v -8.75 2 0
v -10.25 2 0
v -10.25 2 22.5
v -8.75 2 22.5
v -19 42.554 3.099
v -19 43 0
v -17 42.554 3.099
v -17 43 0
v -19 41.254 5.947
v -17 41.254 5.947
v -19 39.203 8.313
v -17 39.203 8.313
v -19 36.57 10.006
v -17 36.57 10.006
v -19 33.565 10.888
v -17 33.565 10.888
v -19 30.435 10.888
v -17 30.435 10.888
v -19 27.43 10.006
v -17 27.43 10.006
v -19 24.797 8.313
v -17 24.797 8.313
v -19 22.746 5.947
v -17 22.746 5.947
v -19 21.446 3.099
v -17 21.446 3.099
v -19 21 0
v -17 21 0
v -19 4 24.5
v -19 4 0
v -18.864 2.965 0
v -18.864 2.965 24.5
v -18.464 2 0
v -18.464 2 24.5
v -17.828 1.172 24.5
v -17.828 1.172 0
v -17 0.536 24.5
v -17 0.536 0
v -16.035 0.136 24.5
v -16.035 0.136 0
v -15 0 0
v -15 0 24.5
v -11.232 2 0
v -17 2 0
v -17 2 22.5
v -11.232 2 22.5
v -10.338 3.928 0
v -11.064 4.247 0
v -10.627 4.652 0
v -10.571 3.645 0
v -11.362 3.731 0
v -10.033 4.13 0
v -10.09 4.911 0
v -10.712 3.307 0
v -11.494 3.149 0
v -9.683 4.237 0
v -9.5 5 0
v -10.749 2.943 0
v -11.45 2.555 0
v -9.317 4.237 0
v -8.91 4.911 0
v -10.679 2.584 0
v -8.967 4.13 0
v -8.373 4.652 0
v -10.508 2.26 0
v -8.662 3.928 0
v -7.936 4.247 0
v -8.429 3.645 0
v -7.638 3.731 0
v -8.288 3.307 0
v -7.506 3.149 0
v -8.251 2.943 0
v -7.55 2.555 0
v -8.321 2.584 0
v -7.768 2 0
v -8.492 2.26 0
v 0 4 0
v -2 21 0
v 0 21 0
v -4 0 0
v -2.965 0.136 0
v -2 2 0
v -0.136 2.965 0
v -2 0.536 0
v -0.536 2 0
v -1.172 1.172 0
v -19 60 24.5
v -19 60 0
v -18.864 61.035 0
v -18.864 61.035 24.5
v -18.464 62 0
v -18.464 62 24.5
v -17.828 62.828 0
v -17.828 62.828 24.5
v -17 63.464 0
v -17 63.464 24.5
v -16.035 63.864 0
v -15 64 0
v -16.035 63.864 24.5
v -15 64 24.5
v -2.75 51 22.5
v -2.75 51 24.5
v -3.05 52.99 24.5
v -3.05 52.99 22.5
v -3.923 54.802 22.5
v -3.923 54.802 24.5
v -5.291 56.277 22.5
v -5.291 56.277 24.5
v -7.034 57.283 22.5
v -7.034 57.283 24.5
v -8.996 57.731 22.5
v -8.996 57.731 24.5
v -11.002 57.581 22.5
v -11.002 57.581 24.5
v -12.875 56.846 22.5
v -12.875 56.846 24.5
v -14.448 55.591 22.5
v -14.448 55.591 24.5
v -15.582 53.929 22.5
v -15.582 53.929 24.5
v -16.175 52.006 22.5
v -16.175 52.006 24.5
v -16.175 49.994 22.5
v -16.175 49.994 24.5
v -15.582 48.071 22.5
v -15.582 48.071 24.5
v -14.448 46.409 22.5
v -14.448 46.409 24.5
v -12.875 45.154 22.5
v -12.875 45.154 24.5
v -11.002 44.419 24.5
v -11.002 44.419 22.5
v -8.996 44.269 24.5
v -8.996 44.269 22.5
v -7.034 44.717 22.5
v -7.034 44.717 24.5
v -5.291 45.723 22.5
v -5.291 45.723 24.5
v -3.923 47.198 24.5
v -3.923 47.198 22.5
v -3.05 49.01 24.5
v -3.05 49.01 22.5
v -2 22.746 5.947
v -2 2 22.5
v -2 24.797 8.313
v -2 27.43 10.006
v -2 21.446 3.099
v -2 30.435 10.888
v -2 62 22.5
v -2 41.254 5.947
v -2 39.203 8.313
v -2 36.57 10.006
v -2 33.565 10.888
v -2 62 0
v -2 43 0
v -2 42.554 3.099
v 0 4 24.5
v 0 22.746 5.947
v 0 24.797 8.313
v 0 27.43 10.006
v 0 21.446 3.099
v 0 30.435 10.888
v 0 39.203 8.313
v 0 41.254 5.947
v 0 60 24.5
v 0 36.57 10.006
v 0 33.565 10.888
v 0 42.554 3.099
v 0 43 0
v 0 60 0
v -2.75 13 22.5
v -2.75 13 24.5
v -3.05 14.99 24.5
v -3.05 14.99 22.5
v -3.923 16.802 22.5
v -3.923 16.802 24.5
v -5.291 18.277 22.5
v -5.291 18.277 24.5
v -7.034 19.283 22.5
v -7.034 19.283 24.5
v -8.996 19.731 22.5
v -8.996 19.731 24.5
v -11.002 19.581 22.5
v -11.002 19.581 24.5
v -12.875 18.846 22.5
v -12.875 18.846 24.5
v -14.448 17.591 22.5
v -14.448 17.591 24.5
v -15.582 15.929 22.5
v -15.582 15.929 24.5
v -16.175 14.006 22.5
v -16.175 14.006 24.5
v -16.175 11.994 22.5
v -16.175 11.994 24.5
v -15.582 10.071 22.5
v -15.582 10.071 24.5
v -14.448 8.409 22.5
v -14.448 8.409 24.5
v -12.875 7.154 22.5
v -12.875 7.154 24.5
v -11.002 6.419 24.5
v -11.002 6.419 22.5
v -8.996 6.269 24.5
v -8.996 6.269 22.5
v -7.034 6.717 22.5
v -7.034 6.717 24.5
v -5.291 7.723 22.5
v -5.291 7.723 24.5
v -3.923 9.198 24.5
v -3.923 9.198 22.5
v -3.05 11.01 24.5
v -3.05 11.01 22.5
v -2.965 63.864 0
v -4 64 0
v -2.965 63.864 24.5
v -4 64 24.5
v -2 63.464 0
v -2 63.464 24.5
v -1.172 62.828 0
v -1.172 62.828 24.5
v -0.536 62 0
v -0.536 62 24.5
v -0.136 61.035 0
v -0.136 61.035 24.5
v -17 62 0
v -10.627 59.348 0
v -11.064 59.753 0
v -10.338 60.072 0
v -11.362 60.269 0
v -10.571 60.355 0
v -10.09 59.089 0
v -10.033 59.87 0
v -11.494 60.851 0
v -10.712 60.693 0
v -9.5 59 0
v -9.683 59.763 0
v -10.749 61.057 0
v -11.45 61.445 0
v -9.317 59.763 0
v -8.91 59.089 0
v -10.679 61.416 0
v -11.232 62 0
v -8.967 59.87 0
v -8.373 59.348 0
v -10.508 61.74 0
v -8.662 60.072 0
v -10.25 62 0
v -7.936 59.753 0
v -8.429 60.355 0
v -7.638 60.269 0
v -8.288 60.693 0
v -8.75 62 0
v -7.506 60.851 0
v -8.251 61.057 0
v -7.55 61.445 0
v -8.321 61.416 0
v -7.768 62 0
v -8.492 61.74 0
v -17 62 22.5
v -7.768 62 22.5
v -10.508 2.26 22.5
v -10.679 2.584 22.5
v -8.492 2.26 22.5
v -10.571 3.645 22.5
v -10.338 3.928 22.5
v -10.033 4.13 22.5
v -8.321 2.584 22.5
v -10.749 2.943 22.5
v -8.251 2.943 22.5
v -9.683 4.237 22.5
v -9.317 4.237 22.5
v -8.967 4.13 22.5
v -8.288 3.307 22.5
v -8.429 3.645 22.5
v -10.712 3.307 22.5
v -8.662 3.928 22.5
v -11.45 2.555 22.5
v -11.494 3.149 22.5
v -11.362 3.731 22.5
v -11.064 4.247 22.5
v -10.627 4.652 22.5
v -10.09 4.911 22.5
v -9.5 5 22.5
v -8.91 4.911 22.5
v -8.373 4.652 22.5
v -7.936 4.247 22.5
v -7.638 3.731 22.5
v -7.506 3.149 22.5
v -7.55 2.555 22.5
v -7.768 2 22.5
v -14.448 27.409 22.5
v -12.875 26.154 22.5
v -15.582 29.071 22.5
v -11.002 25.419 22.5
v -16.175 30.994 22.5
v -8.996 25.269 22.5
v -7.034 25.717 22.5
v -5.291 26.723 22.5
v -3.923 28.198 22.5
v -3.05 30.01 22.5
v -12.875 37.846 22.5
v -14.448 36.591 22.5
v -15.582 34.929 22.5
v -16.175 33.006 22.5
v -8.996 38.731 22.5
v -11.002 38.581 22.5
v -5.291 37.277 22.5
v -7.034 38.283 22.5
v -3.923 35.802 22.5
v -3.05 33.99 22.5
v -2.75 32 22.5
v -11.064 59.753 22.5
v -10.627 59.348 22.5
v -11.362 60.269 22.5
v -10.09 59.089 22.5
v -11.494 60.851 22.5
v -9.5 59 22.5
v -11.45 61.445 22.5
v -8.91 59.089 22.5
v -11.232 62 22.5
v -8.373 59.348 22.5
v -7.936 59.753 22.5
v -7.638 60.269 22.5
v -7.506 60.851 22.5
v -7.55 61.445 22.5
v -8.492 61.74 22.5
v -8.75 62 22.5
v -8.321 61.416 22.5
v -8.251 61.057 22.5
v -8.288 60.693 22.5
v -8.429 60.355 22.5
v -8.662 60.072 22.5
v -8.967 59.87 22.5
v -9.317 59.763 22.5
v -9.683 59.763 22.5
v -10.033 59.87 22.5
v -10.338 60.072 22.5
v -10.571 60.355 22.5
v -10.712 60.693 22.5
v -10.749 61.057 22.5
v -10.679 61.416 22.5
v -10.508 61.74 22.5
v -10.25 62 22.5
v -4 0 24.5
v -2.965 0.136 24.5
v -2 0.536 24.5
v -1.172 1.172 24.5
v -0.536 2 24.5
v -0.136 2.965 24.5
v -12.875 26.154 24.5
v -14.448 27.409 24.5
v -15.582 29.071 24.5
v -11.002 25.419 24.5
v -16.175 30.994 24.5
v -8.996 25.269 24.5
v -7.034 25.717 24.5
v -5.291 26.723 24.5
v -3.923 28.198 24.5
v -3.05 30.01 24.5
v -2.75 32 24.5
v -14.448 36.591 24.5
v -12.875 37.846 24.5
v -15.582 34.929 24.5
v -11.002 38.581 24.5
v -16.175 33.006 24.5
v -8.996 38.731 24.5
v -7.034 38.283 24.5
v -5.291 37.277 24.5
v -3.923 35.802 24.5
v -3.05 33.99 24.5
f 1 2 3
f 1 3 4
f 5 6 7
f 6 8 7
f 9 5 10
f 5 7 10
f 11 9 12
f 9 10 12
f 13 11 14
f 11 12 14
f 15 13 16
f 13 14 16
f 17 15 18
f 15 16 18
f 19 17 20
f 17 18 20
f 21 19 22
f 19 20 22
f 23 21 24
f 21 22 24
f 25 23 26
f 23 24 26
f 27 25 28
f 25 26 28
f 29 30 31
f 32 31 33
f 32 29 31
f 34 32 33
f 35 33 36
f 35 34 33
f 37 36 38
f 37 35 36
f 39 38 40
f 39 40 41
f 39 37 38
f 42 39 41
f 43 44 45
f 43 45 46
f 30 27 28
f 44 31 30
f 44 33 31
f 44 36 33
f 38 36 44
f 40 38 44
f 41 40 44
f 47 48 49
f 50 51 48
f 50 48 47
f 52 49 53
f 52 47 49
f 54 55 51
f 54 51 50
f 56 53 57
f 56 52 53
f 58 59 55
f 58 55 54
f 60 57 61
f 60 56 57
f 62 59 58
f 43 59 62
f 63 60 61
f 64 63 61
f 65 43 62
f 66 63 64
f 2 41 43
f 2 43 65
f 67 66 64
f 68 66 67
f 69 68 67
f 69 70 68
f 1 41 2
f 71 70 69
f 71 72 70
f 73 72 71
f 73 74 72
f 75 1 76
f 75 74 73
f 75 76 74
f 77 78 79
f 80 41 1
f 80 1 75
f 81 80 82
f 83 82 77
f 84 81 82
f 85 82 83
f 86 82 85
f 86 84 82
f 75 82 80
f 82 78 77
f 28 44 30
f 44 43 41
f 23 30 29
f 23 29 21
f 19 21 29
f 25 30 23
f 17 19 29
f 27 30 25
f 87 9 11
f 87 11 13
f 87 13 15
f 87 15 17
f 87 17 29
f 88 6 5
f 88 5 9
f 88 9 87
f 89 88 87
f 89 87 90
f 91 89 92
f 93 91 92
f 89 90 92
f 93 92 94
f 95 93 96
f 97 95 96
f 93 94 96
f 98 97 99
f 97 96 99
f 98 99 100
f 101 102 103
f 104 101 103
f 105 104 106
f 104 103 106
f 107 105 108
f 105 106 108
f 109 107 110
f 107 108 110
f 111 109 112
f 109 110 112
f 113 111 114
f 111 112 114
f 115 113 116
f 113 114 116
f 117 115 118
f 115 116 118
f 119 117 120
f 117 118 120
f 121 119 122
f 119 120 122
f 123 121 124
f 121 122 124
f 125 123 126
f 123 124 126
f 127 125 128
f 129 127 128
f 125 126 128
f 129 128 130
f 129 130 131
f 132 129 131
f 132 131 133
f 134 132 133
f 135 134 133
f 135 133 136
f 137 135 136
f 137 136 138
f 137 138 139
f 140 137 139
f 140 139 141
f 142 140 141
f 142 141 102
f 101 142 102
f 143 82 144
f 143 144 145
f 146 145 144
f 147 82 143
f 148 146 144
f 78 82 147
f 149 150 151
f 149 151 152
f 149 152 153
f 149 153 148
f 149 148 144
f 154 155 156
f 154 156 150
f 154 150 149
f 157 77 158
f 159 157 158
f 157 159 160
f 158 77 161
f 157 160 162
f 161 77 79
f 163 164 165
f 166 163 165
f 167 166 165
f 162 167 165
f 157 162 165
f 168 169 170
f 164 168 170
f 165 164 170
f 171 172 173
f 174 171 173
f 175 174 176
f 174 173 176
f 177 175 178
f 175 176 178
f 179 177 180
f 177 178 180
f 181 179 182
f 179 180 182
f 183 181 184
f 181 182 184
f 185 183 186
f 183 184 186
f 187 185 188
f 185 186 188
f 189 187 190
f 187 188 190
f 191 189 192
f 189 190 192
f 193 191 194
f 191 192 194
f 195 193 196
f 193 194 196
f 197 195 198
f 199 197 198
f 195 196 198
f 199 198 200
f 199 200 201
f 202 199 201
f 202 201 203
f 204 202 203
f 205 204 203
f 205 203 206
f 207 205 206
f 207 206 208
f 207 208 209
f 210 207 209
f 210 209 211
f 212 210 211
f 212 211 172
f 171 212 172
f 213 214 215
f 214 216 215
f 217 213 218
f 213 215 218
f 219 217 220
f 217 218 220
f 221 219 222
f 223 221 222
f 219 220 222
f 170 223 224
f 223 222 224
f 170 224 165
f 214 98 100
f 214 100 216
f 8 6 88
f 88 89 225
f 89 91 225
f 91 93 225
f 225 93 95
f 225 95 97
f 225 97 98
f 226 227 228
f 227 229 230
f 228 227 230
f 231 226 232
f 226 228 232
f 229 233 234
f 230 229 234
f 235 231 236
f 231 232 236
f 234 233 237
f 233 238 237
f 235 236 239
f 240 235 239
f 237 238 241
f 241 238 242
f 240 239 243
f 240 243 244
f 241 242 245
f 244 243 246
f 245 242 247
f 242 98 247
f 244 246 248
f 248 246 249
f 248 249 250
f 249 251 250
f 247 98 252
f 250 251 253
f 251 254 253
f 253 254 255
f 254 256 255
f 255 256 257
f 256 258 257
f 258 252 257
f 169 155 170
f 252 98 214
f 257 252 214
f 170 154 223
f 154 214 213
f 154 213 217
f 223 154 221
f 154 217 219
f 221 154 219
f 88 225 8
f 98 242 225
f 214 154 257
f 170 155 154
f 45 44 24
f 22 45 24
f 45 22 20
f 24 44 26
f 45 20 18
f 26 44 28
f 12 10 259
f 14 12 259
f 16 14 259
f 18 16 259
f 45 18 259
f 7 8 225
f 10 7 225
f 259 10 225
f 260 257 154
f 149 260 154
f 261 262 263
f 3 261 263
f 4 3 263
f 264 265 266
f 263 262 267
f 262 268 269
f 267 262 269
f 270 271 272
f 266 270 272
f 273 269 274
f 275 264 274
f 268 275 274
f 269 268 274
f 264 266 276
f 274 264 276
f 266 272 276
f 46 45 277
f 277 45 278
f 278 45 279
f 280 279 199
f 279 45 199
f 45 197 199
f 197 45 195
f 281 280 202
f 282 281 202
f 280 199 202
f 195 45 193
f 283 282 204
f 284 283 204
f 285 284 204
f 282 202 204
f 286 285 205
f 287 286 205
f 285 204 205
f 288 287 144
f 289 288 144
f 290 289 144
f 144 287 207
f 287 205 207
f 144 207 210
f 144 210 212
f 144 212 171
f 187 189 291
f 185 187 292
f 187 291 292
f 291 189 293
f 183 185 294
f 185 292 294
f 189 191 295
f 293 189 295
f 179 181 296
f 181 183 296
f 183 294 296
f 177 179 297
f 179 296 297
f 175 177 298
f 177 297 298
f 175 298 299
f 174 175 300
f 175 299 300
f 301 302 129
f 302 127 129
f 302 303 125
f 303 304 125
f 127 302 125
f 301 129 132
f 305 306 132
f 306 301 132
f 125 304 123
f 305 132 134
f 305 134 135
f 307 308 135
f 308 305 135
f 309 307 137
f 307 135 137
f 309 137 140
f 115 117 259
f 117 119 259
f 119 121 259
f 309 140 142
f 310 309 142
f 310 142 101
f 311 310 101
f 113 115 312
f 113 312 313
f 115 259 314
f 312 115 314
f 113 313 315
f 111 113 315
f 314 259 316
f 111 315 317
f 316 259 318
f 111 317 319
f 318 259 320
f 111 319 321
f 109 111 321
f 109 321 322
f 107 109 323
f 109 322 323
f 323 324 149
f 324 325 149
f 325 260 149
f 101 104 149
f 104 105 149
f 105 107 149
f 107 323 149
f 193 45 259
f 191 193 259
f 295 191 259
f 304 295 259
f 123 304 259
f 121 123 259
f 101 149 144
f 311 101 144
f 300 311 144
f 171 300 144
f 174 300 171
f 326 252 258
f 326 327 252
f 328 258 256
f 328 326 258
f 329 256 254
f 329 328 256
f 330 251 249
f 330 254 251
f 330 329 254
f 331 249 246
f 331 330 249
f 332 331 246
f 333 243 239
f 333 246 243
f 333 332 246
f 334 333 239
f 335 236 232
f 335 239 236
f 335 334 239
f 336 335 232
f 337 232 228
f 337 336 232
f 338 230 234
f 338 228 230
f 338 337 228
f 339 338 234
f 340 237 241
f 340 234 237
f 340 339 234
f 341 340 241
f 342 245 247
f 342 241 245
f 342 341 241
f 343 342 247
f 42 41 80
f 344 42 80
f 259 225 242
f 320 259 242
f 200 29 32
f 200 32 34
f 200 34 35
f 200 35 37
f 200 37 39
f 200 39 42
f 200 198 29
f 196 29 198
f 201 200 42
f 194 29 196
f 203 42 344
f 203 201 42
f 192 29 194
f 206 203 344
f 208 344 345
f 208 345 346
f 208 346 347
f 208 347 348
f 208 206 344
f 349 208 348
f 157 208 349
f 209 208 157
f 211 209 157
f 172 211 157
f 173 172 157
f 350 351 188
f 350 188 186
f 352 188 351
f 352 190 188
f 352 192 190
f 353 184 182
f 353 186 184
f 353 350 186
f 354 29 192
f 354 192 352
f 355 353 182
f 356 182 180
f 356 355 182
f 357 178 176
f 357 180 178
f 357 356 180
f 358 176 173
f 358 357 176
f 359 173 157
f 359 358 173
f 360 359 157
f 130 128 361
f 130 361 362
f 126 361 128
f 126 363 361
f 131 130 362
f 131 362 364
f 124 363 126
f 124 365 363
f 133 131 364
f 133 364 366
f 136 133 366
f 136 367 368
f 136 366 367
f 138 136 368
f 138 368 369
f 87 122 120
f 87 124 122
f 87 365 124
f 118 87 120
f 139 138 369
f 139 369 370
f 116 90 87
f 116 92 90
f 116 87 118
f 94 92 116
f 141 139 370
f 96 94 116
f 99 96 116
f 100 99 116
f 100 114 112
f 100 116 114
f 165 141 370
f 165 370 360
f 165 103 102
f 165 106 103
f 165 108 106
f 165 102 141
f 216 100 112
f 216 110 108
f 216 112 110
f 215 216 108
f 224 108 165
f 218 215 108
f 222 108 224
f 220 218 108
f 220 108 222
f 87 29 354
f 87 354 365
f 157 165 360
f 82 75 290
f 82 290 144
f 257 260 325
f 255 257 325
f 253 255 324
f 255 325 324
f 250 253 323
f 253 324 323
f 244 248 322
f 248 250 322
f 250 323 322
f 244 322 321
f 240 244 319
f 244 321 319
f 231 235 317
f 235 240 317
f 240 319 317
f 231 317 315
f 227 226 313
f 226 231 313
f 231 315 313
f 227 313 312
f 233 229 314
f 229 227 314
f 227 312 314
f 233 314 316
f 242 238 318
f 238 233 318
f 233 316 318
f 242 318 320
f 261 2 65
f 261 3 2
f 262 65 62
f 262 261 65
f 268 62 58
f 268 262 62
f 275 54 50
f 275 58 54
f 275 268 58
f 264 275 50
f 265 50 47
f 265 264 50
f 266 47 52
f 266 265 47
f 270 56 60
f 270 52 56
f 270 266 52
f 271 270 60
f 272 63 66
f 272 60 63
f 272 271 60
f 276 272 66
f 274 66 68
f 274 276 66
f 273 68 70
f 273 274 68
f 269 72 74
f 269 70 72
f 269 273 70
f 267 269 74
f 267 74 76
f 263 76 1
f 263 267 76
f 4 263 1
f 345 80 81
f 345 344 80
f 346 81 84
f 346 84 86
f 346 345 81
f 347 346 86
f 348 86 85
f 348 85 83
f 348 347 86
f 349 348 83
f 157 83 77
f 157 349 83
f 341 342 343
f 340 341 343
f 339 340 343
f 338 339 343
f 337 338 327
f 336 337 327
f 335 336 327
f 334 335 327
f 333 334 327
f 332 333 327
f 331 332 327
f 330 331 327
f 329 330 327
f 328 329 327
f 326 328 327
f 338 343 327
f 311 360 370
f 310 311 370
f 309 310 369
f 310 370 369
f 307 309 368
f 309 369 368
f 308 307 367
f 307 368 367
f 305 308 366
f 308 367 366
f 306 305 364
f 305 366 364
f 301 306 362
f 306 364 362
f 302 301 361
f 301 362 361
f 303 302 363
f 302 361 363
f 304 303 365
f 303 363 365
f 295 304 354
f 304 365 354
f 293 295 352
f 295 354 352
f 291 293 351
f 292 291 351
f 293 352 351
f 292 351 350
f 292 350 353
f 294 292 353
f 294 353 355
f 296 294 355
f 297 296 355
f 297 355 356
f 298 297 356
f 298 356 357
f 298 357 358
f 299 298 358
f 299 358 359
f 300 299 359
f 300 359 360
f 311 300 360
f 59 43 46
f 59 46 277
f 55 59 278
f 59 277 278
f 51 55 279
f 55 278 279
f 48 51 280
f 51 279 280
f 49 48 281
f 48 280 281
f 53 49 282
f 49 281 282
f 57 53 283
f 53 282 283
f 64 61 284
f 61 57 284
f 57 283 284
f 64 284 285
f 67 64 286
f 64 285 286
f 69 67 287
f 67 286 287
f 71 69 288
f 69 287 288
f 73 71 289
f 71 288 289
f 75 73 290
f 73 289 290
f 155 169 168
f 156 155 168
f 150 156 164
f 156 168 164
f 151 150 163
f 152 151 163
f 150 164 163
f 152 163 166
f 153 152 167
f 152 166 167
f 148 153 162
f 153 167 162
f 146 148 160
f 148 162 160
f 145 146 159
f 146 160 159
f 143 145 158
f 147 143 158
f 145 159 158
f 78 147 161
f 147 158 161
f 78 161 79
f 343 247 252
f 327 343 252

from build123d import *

# Parameters (mm, degrees)
F0_W      = 19
F0_H      = 64
F1_DEPTH  = 24.5
F3_DEPTH  = 25
F4_T      = -2
F5_R      = 4
F6_R      = 6.75
F7_DEPTH  = 25
F8_R      = 2
F8_R_2    = 1.25
F9_DEPTH  = 22.5
F10_R     = 6.75
F11_DEPTH = 25


with BuildPart() as f1:
    # F0 (on Top) → F1 (new body)
    with BuildSketch(Plane.XY):
        with Locations((-9.5, 32)):
            Rectangle(F0_W, F0_H)
    extrude(amount=F1_DEPTH)

    # F2 (on face) → F3 (cut)
    with BuildSketch(Plane.YZ):
        with BuildLine():
            Line((21, 0), (43, 0))
            ThreePointArc((43, 0), (32, 11), (21, 0))
        make_face()
    extrude(amount=-F3_DEPTH, mode=Mode.SUBTRACT)

    # F4
    f4_openings = [f1.faces().sort_by_distance(p)[0] for p in [
        (-9.5, 32, 11),
        (-9.5, 10.5, 0),
        (-9.5, 53.5, 0),
    ]]
    offset(amount=F4_T, openings=f4_openings)

    # F5
    f5_edges = [f1.edges().sort_by_distance(p)[0] for p in [
        (0, 0, 12.25),
        (0, 64, 12.25),
        (-19, 64, 12.25),
        (-19, 0, 12.25),
    ]]
    fillet(f5_edges, radius=F5_R)

    # F6 (on face) → F7 (cut)
    with BuildSketch(Plane.XY.offset(24.5)):
        with Locations((-9.5, 32)):
            Circle(F6_R)
    extrude(amount=-F7_DEPTH, mode=Mode.SUBTRACT)

    # F8 (on face) → F9 (join)
    with BuildSketch(Plane(origin=(0, 0, 22.5), x_dir=(1, 0, 0), z_dir=(0, 0, -1))):
        with Locations((-9.5, -3)):
            Circle(F8_R)
        with Locations((-9.5, -3)):
            Circle(F8_R_2, mode=Mode.SUBTRACT)
        with Locations((-9.5, -61)):
            Circle(F8_R)
        with Locations((-9.5, -61)):
            Circle(F8_R_2, mode=Mode.SUBTRACT)
    extrude(amount=F9_DEPTH)

    # F10 (on face) → F11 (cut)
    with BuildSketch(Plane.XY.offset(24.5)):
        with Locations((-9.5, 51)):
            Circle(F10_R)
        with Locations((-9.5, 13)):
            Circle(F10_R)
    extrude(amount=-F11_DEPTH, mode=Mode.SUBTRACT)


solid = f1.part
